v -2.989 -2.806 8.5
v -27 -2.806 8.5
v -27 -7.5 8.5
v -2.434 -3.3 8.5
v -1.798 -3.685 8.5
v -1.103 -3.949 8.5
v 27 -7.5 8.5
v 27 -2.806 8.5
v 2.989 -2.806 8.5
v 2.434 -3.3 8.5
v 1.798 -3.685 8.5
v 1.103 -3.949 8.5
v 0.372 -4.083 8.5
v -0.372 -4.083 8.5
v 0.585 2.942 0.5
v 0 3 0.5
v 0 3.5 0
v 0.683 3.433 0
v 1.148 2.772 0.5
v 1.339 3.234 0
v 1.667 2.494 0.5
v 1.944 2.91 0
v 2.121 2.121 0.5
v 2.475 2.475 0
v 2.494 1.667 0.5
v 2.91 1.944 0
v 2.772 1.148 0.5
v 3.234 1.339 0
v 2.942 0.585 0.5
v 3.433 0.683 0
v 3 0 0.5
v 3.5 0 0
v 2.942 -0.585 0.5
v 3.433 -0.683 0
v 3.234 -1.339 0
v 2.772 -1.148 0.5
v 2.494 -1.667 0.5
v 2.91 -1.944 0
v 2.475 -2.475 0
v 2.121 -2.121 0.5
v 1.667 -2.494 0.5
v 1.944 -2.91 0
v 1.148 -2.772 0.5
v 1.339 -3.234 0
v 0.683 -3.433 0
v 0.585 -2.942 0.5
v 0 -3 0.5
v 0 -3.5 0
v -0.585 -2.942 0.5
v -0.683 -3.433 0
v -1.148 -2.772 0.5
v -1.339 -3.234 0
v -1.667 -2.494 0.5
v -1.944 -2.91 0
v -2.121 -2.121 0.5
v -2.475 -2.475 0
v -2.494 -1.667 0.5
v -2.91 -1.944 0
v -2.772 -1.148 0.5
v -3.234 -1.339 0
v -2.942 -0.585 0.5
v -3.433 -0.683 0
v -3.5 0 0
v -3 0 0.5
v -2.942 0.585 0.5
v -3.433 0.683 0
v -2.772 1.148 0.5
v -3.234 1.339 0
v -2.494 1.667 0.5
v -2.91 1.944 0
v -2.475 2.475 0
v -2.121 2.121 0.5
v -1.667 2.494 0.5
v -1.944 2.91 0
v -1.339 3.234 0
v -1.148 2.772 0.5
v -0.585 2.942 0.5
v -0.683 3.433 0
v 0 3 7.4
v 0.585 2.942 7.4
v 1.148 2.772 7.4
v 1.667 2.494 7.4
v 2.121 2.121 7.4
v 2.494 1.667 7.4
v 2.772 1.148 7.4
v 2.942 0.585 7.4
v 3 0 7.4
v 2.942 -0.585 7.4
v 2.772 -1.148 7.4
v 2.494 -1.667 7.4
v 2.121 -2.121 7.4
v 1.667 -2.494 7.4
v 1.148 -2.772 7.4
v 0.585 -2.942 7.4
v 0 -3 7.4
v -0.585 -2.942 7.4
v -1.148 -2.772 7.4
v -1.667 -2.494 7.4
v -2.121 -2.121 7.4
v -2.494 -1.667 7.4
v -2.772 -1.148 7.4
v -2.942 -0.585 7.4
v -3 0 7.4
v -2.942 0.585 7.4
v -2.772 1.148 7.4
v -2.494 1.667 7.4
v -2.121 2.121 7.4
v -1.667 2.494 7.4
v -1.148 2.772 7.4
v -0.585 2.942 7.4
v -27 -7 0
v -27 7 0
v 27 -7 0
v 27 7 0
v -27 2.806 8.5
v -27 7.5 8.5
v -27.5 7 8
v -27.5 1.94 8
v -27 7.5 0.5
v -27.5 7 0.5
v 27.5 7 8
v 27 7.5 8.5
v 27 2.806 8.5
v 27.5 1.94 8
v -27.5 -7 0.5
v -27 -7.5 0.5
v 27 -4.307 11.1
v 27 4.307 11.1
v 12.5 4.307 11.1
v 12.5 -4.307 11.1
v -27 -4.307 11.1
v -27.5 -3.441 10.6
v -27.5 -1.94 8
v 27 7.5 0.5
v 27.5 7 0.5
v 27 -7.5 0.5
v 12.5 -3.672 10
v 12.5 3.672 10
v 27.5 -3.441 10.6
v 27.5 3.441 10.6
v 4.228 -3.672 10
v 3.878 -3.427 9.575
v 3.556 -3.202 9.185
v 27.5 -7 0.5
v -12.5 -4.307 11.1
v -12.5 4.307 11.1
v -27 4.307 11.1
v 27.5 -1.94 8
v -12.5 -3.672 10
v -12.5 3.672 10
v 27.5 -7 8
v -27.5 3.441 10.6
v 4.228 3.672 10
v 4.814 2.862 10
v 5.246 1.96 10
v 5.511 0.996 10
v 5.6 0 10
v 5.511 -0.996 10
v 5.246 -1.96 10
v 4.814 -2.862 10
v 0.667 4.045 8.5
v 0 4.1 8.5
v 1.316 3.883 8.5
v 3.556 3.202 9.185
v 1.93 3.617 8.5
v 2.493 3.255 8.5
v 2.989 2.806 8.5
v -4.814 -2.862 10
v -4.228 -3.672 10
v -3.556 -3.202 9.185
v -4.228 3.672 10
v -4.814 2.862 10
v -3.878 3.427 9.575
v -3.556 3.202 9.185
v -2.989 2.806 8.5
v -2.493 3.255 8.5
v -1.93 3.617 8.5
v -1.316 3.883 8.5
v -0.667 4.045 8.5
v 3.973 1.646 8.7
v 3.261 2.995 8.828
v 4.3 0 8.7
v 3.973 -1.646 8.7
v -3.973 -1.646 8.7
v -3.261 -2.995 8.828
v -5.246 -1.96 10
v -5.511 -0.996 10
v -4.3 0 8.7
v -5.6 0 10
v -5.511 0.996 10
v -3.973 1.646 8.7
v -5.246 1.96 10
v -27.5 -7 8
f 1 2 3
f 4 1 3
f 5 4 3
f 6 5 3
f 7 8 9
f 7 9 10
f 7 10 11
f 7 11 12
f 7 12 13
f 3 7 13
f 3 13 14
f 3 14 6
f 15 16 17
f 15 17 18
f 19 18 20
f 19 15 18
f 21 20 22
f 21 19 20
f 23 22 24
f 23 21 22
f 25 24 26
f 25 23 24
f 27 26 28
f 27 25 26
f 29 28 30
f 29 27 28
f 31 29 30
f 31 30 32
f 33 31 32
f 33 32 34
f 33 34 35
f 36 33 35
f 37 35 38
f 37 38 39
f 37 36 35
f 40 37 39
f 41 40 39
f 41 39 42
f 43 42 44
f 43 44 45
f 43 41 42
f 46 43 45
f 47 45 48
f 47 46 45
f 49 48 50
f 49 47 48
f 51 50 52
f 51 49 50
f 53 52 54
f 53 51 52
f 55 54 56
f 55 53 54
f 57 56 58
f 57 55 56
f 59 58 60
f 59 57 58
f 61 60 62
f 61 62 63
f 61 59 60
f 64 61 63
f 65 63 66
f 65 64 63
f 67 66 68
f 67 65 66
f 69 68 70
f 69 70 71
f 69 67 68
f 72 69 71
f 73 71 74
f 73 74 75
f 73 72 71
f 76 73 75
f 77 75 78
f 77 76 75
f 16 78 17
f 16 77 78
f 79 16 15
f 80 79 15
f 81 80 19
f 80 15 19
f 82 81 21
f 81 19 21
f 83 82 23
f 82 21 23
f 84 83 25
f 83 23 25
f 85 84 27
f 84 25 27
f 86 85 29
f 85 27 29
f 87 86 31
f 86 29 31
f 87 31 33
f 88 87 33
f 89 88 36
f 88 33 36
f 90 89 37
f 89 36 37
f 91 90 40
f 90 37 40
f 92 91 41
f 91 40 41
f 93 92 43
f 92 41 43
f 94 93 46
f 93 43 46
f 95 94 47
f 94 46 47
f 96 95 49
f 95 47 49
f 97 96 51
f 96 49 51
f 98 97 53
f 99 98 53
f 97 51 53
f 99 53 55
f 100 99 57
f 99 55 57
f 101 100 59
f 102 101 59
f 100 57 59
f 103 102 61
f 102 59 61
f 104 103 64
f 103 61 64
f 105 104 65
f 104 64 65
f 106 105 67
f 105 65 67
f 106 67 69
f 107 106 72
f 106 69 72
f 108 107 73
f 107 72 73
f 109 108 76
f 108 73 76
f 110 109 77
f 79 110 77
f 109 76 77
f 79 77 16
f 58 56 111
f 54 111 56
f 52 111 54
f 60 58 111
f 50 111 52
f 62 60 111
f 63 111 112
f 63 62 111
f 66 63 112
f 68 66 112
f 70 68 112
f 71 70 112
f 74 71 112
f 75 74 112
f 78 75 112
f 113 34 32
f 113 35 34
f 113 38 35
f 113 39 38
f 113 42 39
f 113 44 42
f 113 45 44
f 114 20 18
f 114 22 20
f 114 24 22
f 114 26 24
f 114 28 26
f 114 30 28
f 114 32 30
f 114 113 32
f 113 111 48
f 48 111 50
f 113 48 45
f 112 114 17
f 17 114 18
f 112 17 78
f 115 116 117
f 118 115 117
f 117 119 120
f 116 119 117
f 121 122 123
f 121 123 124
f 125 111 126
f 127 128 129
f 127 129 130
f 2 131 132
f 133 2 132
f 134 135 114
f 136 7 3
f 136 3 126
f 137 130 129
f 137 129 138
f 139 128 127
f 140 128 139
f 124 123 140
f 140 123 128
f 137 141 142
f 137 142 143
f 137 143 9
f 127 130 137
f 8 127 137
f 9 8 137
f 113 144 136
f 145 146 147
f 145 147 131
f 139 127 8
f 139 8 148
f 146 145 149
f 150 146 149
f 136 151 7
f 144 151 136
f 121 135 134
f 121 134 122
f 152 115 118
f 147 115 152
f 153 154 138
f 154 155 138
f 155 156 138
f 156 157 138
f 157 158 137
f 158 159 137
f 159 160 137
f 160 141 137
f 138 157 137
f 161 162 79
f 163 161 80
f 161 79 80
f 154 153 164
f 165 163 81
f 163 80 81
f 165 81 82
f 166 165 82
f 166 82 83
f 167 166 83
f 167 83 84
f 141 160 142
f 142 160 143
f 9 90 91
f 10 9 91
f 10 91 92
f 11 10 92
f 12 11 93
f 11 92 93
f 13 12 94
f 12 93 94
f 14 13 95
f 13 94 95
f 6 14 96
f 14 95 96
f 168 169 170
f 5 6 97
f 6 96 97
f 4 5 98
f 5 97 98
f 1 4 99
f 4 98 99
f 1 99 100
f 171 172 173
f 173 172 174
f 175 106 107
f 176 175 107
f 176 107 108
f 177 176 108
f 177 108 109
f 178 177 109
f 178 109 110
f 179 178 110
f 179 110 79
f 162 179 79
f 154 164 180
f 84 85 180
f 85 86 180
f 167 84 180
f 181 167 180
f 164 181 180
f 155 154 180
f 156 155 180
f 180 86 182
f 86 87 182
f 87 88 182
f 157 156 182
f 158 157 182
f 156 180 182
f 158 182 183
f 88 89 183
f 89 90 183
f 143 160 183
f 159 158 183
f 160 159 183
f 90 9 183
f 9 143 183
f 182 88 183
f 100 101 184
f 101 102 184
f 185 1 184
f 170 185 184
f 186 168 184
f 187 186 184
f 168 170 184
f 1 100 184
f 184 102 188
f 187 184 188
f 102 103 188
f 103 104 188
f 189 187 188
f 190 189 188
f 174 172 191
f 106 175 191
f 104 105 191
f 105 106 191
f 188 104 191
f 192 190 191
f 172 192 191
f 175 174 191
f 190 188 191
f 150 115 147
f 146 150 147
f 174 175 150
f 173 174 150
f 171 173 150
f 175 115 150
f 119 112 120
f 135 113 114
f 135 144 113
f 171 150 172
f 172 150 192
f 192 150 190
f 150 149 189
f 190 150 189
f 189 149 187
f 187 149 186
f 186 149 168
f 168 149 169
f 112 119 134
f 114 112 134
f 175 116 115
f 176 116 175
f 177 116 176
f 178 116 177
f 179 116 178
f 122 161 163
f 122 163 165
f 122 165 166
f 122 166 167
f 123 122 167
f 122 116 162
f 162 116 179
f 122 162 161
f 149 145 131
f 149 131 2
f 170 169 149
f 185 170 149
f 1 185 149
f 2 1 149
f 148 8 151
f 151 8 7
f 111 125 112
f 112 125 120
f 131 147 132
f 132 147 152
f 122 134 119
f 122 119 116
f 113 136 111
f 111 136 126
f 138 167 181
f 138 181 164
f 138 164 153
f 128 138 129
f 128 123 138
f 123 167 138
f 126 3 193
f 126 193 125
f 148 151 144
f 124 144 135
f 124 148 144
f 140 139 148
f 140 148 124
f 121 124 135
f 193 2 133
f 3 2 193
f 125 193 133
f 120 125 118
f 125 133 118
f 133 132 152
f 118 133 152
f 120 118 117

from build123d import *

# Parameters (mm, degrees)
PAD002_DEPTH        = 27.5
SKETCH005_W         = 1.1
SKETCH005_H         = 25
POCKET001_DEPTH     = 15.001
HOLE001_D           = 6
HOLE001_DEPTH       = 25
HOLE001_CSINK_D     = 11.2
HOLE001_CSINK_ANGLE = 90
CHAMFER_SIZE        = 0.5


with BuildPart() as part:
    # Sketch004 → Pad002 (new body, symmetric)
    with BuildSketch(Plane.YZ):
        Polygon((-7.5, 0), (7.5, 0), (7.5, 8.5), (2.806069, 8.5), (4.30718, 11.1), (-4.30718, 11.1), (-2.806069, 8.5), (-7.5, 8.5), align=None)
    extrude(amount=PAD002_DEPTH, both=True)

    # Sketch005 (on Face8 of Pad002) → Pocket001 (cut, through all)
    with BuildSketch(Plane(origin=(0, -7.5, 0), x_dir=(0, 0, -1), z_dir=(0, -1, 0))):
        with Locations((-10.55, 0)):
            Rectangle(SKETCH005_W, SKETCH005_H)
    extrude(amount=-POCKET001_DEPTH, mode=Mode.SUBTRACT)

    # Hole001
    with Locations(Plane(origin=(0, 0, 10), x_dir=(0, -1, 0), z_dir=(0, 0, 1))):
        with Locations((0, 0)):
            CounterSinkHole(HOLE001_D / 2, HOLE001_CSINK_D / 2, depth=HOLE001_DEPTH, counter_sink_angle=HOLE001_CSINK_ANGLE)

    # Chamfer
    chamfer_edges = [part.edges().sort_by_distance(p)[0] for p in [
        (27.5, 0, 0),
        (27.5, 7.5, 4.25),
        (27.5, 5.153034, 8.5),
        (27.5, 3.556624, 9.8),
        (27.5, 0, 11.1),
        (27.5, -3.556624, 9.8),
        (27.5, -5.153034, 8.5),
        (27.5, -7.5, 4.25),
        (0, -7.5, 0),
        (-27.5, 0, 0),
        (0, 7.5, 0),
        (0, -3, 0),
        (-27.5, 7.5, 4.25),
        (-27.5, 5.153034, 8.5),
        (-27.5, 3.556624, 9.8),
        (-27.5, 0, 11.1),
        (-27.5, -3.556624, 9.8),
        (-27.5, -5.153034, 8.5),
        (-27.5, -7.5, 4.25),
    ]]
    chamfer(chamfer_edges, length=CHAMFER_SIZE)


solid = part.part
